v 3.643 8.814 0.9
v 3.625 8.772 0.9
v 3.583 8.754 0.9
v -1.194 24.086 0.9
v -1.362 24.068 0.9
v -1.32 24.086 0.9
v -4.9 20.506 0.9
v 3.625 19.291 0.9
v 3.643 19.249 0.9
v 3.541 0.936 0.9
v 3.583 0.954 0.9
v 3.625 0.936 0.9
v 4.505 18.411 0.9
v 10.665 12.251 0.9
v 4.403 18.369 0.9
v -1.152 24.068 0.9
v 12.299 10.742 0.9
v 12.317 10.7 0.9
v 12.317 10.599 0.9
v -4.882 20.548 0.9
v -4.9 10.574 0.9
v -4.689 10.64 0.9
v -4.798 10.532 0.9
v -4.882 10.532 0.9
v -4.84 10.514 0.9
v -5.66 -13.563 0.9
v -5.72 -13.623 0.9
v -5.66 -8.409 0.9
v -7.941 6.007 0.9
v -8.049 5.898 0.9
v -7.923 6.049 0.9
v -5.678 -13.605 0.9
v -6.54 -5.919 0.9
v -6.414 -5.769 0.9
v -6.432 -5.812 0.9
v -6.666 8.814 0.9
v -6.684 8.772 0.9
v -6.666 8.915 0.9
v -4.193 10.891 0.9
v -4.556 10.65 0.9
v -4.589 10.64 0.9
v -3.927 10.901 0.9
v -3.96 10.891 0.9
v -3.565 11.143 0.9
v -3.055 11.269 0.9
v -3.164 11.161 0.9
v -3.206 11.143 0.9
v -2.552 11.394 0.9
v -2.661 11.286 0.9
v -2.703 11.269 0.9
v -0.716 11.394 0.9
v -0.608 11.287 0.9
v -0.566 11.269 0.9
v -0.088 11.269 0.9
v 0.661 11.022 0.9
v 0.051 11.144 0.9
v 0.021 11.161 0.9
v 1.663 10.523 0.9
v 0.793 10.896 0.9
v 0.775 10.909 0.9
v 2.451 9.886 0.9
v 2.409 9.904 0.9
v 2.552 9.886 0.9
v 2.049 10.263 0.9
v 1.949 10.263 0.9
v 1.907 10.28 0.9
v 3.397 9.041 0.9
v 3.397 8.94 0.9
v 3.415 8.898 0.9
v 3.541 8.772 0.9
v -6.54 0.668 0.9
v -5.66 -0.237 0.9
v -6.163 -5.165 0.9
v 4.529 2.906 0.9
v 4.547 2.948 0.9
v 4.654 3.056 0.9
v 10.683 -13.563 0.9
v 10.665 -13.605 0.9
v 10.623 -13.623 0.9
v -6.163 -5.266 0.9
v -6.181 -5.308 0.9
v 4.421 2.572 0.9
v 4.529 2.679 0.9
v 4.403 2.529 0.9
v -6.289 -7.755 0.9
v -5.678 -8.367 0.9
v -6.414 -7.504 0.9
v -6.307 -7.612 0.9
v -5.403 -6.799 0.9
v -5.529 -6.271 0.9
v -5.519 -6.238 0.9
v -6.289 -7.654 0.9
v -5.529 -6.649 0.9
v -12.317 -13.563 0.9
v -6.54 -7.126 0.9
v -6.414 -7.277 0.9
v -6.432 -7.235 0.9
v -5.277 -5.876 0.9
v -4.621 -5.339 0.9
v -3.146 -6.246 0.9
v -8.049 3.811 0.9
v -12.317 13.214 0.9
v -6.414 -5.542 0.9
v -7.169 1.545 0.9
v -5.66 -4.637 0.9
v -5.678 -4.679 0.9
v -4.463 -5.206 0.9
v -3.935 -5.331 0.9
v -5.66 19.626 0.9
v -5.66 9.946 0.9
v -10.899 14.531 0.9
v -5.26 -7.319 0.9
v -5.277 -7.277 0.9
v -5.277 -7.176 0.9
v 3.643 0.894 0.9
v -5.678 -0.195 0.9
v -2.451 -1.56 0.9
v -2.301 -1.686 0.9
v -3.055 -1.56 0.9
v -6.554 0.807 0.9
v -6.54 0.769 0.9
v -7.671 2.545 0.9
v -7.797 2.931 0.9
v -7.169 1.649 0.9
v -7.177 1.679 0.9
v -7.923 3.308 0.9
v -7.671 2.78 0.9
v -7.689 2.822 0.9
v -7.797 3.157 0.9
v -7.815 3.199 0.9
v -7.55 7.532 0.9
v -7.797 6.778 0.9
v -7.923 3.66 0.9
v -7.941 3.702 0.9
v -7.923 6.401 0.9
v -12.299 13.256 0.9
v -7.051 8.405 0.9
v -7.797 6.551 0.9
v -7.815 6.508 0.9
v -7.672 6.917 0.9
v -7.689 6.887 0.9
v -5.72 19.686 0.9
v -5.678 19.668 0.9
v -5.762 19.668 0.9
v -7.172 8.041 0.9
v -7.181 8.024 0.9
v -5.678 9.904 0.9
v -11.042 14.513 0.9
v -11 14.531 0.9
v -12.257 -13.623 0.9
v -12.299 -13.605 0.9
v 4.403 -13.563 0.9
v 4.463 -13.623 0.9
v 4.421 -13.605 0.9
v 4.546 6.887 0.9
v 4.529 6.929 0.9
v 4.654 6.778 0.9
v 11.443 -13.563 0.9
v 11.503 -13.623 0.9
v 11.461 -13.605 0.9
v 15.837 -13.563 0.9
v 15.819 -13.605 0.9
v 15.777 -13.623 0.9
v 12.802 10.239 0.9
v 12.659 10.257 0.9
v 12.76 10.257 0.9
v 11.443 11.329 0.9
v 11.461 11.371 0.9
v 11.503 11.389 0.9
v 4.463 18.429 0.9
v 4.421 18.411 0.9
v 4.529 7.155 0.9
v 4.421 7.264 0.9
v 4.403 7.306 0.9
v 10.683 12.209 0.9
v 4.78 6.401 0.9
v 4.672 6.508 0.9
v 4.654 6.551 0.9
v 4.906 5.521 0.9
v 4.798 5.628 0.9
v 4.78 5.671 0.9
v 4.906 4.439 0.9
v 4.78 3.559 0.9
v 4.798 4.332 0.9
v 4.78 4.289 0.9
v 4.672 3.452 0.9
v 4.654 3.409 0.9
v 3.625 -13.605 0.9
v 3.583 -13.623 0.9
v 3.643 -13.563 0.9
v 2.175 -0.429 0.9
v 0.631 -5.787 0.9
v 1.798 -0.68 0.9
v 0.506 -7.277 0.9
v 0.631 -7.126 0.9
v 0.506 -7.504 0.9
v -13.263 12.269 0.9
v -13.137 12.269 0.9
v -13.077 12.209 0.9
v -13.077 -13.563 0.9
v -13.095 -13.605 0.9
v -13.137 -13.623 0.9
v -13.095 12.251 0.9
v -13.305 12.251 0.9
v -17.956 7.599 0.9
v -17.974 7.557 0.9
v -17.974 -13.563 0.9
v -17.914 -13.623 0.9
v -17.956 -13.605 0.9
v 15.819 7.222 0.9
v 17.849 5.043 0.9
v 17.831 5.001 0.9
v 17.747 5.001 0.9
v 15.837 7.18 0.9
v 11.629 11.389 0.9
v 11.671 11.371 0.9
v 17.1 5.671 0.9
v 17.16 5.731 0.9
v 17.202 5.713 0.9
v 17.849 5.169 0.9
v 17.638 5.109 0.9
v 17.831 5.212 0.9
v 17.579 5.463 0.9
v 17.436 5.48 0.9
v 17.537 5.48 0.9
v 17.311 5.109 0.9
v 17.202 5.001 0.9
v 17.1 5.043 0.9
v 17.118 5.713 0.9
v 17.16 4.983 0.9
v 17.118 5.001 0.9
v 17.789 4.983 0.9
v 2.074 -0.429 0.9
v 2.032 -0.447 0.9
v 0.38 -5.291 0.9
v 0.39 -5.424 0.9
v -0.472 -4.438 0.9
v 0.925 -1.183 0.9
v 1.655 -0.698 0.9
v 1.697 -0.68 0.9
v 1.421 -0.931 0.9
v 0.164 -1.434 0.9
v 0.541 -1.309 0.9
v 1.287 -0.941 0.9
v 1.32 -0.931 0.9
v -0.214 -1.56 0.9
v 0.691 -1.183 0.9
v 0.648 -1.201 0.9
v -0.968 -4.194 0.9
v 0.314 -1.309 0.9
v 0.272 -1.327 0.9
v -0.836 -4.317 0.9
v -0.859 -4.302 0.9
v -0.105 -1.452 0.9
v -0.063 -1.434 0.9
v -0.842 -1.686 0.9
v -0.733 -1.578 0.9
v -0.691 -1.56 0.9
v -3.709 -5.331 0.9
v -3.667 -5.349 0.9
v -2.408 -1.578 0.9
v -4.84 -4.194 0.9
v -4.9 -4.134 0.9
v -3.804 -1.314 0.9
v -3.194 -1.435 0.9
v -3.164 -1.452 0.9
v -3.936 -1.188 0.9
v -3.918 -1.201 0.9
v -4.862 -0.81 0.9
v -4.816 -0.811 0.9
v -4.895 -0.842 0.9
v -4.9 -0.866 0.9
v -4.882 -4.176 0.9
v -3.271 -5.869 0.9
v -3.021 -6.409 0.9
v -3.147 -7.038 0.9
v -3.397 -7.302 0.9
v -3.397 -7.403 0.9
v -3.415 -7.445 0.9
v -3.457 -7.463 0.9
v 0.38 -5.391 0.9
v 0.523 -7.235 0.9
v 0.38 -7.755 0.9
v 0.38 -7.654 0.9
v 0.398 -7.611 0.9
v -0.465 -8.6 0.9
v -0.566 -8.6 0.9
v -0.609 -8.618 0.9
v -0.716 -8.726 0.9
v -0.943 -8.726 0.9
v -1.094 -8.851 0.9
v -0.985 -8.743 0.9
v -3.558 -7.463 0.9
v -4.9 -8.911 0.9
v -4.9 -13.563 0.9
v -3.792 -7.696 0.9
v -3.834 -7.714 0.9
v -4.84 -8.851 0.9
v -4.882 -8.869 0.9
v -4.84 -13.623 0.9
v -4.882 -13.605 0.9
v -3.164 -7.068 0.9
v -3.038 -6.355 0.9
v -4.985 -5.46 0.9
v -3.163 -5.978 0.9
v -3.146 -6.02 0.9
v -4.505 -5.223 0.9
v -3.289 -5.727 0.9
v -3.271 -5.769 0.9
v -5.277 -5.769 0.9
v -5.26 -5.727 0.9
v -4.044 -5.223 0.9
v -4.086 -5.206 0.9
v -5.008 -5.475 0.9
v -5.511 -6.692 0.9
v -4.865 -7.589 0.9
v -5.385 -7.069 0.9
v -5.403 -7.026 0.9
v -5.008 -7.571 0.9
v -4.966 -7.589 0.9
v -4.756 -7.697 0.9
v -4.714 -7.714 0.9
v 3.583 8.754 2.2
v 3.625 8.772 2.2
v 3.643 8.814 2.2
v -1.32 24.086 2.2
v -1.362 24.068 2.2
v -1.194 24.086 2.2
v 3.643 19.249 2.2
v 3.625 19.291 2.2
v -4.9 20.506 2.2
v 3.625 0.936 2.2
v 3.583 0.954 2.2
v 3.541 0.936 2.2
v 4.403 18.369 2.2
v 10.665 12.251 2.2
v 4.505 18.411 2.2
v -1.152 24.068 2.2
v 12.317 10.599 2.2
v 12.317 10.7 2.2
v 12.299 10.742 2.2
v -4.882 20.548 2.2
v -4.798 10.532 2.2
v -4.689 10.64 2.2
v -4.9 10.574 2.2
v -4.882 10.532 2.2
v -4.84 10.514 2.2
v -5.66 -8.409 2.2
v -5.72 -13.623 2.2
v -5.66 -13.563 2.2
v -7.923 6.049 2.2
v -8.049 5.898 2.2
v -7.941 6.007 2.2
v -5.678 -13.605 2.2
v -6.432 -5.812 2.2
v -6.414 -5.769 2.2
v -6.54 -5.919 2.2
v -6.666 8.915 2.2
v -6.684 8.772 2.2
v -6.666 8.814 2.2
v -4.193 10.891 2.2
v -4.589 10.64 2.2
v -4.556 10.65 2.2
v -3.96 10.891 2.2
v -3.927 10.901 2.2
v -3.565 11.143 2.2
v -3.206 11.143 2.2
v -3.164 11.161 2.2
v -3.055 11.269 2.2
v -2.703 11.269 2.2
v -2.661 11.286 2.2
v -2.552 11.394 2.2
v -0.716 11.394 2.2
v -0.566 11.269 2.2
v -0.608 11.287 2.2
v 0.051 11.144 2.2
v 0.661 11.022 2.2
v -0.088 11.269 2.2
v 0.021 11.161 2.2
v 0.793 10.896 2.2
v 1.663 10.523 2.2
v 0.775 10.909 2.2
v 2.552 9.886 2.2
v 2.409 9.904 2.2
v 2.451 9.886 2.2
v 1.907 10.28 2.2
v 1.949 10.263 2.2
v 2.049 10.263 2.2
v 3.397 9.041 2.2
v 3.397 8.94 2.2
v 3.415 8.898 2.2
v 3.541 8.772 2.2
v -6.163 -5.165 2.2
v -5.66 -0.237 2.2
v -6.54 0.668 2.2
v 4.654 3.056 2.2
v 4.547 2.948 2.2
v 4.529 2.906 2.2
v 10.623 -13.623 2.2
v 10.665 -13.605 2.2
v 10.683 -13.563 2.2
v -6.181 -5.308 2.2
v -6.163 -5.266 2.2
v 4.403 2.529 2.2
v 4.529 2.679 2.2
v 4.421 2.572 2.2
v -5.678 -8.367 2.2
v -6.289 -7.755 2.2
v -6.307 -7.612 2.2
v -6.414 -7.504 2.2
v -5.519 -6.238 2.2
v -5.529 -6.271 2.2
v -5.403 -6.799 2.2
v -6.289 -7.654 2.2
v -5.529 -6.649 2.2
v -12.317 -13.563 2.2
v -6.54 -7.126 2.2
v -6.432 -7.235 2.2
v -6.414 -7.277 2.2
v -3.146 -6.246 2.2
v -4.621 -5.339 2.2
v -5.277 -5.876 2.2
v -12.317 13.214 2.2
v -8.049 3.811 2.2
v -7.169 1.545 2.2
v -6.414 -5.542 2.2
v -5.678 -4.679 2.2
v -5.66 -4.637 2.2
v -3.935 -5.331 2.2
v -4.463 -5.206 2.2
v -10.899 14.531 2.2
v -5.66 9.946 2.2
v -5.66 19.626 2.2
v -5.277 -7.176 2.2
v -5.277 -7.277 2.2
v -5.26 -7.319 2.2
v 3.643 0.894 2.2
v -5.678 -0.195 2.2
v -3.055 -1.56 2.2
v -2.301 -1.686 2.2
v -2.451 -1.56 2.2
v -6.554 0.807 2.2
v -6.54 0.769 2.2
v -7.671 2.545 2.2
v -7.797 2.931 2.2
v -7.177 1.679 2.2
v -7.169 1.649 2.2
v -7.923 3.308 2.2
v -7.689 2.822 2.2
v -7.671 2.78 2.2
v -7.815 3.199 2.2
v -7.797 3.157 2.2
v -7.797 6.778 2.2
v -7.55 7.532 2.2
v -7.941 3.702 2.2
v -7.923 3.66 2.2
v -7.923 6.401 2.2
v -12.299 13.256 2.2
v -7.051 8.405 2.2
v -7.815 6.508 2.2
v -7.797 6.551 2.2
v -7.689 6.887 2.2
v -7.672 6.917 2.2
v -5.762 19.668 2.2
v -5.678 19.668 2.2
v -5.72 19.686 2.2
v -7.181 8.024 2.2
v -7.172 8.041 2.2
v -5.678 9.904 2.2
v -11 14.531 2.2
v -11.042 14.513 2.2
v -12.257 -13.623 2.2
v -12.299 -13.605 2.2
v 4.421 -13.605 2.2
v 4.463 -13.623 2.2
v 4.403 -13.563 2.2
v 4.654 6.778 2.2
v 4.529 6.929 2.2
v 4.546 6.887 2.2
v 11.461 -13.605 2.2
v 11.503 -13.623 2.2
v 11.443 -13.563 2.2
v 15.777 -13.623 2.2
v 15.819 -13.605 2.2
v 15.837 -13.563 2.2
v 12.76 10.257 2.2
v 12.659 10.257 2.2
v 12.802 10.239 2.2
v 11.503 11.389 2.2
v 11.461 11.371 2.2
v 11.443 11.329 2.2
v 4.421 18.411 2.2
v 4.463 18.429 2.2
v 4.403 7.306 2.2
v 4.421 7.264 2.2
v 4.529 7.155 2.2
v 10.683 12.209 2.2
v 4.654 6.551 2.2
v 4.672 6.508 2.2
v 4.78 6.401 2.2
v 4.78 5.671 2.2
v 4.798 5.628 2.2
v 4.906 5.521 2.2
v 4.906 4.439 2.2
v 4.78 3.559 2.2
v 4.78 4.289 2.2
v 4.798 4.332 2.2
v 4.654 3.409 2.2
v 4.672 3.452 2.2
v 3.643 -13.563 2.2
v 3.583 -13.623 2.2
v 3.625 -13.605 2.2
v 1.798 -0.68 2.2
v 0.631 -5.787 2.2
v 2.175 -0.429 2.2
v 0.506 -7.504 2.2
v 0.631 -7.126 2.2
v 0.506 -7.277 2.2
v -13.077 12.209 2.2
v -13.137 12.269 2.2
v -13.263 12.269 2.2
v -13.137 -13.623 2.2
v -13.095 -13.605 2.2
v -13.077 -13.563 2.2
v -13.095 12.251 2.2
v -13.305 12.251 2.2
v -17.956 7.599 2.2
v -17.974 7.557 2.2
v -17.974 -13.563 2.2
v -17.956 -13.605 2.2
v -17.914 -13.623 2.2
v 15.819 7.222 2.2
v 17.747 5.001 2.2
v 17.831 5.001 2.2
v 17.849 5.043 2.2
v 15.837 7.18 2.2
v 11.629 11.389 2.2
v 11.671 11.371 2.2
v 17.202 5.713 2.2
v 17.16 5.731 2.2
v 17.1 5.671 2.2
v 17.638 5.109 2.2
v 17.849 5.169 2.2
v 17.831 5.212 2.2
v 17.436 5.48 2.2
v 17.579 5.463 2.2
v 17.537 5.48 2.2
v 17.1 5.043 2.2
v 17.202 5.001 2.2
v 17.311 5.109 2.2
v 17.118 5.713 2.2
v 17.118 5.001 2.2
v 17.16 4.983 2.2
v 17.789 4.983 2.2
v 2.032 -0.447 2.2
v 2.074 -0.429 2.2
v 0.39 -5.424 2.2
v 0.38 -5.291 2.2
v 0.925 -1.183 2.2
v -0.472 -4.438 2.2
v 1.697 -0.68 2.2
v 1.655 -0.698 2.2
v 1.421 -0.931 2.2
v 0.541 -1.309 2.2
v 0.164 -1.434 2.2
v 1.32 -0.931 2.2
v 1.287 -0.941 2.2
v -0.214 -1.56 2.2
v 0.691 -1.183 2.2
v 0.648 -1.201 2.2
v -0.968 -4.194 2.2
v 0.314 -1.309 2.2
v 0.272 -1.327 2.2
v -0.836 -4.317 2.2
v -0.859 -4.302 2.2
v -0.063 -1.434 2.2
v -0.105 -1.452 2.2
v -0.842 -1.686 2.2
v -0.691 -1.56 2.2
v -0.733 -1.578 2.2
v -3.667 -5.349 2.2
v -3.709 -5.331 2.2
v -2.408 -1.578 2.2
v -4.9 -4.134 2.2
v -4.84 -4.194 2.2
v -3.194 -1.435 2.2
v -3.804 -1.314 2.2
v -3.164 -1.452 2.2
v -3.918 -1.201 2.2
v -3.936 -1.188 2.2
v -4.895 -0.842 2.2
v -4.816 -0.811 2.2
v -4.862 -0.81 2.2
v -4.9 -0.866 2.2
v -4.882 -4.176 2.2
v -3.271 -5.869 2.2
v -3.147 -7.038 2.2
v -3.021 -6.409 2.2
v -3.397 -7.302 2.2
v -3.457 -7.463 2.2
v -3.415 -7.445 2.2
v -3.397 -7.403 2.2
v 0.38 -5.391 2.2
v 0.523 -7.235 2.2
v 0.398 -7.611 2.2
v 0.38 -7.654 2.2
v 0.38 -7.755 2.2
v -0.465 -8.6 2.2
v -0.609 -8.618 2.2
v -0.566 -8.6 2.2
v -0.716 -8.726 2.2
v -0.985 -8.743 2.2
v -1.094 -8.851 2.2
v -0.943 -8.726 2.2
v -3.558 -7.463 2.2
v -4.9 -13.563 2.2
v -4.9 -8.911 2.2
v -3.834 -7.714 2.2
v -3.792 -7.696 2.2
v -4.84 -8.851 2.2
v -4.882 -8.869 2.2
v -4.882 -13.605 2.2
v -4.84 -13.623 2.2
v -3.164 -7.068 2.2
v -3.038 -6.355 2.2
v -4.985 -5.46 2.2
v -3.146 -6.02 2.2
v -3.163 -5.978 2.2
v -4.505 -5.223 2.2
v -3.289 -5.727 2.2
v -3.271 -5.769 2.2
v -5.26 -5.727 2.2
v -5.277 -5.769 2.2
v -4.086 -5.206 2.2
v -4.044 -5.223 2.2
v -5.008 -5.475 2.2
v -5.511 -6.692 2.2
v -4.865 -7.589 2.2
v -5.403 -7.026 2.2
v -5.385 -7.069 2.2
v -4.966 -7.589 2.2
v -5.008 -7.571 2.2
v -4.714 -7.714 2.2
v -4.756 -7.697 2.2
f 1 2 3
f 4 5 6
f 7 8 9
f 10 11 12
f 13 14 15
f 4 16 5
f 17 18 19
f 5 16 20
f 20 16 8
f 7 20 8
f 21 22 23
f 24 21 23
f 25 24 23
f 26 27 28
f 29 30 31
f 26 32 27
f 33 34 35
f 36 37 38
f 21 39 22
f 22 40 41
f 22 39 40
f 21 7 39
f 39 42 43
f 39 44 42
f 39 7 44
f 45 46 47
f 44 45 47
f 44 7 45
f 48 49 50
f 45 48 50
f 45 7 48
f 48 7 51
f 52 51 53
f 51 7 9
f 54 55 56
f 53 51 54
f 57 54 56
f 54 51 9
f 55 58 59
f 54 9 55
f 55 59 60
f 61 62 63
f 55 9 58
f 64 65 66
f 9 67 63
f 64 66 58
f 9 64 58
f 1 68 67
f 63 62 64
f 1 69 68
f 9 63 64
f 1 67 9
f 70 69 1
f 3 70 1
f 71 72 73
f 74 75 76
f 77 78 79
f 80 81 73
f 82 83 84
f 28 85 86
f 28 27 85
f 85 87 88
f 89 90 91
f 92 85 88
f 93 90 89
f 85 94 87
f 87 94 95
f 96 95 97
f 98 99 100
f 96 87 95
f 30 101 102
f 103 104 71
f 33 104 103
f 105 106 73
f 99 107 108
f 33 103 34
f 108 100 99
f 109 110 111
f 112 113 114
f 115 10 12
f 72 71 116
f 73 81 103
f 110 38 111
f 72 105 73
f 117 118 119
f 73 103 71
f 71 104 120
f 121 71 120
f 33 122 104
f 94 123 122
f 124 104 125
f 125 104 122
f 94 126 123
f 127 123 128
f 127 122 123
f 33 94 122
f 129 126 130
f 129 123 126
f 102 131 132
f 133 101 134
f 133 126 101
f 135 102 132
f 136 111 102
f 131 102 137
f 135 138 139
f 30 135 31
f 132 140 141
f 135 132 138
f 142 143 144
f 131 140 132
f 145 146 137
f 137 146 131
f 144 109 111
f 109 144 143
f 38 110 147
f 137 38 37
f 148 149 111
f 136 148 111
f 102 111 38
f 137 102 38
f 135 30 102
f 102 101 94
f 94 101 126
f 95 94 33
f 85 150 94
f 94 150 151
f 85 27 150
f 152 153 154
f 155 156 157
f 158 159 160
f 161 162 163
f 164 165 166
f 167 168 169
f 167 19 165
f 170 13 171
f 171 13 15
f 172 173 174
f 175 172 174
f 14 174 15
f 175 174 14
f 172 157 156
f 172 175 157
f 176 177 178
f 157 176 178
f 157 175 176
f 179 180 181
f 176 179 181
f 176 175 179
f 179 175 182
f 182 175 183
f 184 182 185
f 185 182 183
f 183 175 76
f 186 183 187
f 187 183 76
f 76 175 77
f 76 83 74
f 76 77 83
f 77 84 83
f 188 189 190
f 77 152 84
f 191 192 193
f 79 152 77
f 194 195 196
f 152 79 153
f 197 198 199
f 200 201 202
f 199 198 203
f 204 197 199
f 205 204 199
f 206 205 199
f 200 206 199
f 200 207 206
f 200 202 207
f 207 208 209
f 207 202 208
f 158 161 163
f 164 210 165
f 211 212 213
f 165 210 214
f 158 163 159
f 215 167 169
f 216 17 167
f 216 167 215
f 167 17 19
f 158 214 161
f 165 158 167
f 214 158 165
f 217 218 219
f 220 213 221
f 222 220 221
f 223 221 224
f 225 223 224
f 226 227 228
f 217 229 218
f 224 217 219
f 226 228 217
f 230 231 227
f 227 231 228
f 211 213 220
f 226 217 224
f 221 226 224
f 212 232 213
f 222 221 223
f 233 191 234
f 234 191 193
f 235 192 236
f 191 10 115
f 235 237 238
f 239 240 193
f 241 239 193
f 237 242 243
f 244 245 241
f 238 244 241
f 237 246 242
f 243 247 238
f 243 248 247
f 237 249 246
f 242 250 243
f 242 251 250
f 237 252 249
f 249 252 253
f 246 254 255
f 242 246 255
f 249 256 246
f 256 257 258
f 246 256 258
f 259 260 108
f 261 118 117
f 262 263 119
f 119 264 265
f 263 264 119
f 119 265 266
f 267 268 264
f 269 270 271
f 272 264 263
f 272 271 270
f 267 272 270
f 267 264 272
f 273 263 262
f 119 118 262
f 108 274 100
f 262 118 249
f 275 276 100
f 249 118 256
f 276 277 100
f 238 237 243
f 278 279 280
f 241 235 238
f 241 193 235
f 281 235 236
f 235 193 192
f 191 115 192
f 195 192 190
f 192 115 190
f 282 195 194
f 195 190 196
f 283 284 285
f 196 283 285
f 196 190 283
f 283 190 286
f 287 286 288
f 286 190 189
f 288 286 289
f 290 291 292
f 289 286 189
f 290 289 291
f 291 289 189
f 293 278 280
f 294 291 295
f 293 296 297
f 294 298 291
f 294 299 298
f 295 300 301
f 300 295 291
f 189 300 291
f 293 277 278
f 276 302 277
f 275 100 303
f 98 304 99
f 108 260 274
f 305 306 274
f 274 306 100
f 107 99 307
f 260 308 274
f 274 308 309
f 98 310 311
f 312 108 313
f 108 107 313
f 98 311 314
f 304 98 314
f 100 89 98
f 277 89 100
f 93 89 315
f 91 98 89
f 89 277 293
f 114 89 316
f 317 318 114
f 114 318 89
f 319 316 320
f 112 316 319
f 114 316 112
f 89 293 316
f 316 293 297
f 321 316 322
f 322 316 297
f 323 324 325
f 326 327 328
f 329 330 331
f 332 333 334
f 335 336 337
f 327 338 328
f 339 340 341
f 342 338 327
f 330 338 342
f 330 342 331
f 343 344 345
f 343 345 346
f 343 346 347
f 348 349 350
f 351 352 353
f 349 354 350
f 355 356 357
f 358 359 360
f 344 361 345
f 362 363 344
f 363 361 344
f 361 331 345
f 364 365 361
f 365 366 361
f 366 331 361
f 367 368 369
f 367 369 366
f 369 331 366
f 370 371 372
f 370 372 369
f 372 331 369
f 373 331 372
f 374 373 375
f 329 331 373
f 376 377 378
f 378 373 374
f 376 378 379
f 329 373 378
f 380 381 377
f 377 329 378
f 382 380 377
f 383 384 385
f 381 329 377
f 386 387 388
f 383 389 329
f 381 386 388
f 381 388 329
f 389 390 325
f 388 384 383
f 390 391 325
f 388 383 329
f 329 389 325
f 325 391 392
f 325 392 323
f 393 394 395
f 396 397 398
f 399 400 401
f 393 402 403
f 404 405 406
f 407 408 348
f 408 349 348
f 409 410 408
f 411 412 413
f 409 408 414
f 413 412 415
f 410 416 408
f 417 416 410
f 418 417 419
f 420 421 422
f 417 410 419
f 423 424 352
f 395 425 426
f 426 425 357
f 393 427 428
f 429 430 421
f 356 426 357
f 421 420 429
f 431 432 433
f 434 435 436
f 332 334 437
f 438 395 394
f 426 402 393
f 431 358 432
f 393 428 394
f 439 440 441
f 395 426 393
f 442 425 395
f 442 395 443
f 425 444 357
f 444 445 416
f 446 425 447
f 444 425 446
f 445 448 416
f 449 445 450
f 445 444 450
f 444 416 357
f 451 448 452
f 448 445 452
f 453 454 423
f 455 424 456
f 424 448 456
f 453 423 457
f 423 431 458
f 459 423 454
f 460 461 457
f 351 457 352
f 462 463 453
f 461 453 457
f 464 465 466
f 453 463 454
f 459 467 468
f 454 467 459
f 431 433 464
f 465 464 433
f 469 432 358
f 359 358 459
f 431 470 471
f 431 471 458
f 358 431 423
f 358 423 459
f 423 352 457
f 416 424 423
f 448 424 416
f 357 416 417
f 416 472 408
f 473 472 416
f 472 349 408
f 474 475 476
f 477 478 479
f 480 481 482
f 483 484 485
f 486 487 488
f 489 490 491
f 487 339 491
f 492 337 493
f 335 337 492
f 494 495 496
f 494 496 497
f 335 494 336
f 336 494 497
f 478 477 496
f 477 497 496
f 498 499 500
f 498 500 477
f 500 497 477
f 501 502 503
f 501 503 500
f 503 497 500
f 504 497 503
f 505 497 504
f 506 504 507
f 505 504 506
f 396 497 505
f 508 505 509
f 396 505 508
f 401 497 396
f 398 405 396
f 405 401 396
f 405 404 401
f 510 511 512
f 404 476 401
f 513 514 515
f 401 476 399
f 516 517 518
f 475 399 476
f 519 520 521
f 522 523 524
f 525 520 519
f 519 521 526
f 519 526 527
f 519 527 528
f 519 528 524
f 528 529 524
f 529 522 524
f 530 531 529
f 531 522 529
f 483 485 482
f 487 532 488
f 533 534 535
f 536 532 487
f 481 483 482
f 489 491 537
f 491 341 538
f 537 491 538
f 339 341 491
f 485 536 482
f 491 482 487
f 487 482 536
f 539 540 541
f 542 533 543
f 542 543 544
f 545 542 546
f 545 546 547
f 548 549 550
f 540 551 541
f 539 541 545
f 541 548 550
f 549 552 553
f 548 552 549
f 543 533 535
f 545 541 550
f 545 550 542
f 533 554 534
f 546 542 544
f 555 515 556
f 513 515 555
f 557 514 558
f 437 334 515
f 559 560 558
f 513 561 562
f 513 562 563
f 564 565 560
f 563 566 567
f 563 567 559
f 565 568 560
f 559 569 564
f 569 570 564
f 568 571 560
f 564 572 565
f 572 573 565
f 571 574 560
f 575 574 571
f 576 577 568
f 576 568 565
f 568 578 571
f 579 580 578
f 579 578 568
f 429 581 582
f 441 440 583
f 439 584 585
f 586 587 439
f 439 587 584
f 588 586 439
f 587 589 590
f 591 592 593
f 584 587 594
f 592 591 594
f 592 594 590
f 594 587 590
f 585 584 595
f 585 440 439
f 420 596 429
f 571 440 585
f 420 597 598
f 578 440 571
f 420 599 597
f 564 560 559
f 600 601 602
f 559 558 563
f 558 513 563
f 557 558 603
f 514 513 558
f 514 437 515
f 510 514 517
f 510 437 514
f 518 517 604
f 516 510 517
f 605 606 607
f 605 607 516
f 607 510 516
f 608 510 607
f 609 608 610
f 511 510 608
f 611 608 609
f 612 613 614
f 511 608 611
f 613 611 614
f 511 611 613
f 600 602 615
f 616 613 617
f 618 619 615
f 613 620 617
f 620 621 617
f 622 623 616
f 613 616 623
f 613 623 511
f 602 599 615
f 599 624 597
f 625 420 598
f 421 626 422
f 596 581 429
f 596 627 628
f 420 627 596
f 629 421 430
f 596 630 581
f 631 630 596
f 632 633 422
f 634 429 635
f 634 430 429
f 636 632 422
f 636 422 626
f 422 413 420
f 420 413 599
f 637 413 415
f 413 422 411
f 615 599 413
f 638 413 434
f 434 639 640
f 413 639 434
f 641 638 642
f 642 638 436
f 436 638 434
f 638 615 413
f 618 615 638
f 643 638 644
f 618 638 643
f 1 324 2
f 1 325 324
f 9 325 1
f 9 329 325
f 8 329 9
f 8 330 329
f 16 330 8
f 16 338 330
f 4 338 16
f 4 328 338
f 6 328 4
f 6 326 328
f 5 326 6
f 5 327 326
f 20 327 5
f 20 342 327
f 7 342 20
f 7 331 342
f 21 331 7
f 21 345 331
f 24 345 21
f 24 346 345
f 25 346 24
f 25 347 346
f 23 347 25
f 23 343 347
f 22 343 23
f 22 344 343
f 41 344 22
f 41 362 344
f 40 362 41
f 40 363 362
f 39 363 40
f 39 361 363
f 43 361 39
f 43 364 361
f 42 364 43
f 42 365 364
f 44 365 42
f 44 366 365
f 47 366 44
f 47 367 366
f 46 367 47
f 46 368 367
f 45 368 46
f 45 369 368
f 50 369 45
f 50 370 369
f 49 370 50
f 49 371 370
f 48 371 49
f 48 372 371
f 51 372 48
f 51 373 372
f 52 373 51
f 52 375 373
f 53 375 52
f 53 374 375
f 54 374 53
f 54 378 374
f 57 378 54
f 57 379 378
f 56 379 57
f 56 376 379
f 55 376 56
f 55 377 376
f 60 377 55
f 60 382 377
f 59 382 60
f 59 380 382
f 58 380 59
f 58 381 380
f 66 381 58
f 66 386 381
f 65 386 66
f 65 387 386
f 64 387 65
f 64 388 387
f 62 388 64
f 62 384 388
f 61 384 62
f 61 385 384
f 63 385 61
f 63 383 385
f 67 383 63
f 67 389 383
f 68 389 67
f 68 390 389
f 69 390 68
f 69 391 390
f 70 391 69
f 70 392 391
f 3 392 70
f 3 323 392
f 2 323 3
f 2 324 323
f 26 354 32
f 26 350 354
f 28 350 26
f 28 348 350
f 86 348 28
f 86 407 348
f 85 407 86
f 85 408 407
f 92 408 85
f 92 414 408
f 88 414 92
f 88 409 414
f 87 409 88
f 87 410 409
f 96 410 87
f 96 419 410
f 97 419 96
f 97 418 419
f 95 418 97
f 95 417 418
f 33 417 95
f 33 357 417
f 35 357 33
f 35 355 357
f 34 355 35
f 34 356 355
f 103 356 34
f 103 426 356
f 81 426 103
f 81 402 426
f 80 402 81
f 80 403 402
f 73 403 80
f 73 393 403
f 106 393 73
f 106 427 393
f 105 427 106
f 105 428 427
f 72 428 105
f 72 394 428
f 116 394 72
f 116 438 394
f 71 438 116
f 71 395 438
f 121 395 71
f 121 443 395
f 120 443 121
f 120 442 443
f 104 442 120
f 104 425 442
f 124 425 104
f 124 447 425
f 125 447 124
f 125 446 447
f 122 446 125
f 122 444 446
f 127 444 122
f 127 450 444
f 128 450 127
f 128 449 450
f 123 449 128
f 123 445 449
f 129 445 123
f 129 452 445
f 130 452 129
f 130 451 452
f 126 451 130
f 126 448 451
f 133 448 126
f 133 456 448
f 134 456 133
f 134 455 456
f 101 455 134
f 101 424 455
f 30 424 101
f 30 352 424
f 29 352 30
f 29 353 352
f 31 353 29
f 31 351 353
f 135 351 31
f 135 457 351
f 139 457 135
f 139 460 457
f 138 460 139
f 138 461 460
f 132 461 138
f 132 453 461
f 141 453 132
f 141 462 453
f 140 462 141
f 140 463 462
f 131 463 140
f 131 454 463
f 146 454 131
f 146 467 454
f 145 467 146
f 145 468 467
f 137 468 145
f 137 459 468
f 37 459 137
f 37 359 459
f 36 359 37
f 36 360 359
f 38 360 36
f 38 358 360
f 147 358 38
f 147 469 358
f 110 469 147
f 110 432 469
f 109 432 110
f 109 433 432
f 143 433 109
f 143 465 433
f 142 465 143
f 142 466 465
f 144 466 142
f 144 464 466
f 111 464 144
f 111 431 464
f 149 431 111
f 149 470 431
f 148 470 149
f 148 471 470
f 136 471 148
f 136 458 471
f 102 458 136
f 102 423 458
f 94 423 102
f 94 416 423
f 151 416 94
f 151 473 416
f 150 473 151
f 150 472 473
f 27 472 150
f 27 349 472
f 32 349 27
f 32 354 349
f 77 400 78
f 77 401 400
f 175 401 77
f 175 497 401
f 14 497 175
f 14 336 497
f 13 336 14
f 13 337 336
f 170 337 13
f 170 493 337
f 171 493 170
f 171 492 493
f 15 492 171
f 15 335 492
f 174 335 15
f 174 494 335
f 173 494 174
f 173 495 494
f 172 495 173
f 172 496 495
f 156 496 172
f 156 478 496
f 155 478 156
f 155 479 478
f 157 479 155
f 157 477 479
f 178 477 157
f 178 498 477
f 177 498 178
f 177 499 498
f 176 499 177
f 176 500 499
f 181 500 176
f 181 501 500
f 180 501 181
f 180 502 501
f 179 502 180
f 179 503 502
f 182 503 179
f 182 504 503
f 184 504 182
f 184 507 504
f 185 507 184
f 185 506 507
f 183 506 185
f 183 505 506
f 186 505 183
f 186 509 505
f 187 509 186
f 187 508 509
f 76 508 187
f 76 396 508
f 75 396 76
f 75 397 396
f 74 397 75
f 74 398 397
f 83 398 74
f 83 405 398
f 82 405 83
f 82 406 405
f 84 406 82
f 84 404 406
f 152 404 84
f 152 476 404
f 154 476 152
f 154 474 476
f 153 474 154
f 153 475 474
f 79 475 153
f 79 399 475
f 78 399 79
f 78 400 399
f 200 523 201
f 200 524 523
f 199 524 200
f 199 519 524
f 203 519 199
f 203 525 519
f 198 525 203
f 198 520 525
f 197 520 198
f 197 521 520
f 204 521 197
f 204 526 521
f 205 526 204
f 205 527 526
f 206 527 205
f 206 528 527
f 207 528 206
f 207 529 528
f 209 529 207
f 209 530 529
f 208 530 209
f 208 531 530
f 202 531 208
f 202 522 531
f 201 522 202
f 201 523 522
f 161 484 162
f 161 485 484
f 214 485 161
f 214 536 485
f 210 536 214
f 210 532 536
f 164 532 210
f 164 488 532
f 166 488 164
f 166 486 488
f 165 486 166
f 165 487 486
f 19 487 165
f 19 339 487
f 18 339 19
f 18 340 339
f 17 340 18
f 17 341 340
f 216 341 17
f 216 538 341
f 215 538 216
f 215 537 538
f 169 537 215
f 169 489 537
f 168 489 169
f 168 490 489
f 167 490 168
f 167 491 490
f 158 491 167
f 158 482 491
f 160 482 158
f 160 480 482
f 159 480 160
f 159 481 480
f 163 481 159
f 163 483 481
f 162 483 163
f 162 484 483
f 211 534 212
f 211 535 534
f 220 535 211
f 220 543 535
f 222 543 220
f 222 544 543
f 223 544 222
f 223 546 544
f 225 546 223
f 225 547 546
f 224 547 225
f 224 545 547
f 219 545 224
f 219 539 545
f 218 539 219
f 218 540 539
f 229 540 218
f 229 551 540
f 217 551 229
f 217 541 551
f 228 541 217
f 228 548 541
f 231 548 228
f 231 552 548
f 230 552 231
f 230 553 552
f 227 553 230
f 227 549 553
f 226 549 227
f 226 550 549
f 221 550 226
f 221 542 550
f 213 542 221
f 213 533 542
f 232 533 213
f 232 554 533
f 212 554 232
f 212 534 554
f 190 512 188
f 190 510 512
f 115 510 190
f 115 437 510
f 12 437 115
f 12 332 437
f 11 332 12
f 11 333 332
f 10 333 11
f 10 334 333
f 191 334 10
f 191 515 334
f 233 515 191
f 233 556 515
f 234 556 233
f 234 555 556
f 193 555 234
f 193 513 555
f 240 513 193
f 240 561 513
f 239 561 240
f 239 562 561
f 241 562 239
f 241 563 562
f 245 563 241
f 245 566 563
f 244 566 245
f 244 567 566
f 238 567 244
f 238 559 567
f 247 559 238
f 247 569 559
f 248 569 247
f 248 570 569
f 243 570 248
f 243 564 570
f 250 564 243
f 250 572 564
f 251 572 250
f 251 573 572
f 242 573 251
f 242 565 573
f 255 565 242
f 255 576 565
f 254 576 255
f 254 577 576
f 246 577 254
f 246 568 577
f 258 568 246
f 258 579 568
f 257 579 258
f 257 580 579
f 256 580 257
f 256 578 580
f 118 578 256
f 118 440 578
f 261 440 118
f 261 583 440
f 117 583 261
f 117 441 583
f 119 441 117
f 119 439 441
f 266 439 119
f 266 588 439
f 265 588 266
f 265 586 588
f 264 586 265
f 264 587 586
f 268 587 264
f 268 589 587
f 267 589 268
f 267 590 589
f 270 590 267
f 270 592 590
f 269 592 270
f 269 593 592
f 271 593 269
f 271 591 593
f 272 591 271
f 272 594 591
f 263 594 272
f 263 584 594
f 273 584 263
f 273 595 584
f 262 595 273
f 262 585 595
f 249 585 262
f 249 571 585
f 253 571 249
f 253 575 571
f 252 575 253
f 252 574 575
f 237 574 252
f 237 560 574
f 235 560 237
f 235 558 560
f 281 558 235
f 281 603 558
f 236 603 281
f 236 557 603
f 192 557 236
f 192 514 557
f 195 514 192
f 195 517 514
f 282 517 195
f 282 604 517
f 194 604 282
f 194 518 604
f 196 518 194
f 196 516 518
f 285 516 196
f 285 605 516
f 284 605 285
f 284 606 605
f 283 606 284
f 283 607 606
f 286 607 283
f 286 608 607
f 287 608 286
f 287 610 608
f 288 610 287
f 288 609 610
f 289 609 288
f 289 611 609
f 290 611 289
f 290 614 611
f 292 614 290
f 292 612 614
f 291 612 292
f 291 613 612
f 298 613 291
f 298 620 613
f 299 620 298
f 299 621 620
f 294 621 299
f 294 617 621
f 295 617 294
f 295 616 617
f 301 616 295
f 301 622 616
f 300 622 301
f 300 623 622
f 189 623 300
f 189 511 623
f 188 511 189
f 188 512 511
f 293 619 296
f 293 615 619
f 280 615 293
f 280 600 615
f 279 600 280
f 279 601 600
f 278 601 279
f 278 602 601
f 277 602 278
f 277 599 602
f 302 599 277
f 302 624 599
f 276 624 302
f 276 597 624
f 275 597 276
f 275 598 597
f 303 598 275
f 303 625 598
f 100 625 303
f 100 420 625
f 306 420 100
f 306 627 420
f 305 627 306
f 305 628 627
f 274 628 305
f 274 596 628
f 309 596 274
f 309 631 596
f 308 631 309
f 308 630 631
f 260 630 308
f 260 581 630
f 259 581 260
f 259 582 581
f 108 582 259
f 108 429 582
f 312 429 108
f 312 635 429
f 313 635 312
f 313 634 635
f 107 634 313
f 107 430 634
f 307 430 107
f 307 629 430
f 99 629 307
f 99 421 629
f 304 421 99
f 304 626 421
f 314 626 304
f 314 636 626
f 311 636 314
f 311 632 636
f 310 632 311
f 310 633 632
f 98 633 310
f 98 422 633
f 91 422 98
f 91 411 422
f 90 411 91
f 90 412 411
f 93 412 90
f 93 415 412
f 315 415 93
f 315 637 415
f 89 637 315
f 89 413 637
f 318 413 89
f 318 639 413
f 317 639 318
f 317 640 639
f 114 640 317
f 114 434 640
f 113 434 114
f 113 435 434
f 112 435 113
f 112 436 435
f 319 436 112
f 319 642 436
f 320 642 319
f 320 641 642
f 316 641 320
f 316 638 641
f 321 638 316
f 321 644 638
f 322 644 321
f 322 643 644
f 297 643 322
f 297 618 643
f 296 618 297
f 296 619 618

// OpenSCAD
$fn = 24;
translate([0, -2.500, 0.900])
  linear_extrude(height=1.300) {
offset(r=0.06, $fn=8) {
    polygon(points=[[-4.463,-2.766],[-4.589,-2.891],[-4.966,-3.017],[-5.217,-3.269],[-5.217,-3.394],[-5.469,-3.771],[-5.469,-4.149],[-5.343,-4.274],[-5.343,-4.526],[-5.217,-4.651],[-5.217,-4.777],[-4.966,-5.029],[-4.840,-5.029],[-4.714,-5.154],[-3.834,-5.154],[-3.583,-4.903],[-3.457,-4.903],[-3.457,-4.777],[-3.206,-4.526],[-3.080,-3.897],[-3.206,-3.771],[-3.206,-3.520],[-3.331,-3.394],[-3.331,-3.269],[-3.709,-2.891],[-3.960,-2.891],[-4.086,-2.766]], paths=[[0,1,2,3,4,5,6,7,8,9,10,11,12,13,14,15,16,17,18,19,20,21,22,23,24,25,26]]);
    polygon(points=[[3.583,3.520],[3.583,3.394],[2.200,2.011],[2.074,2.011],[1.823,1.760],[1.697,1.760],[1.446,1.509],[1.320,1.509],[0.943,1.257],[0.691,1.257],[0.566,1.131],[0.314,1.131],[0.189,1.006],[-0.063,1.006],[-0.189,0.880],[-0.691,0.880],[-0.817,0.754],[-2.326,0.754],[-2.451,0.880],[-3.080,0.880],[-3.206,1.006],[-3.834,1.131],[-3.960,1.257],[-4.840,1.634],[-4.840,-1.634],[-0.943,-1.634],[-0.817,-1.760],[-0.440,-1.886],[0.440,-2.766],[0.440,-2.891],[0.691,-3.269],[0.691,-4.651],[0.566,-4.777],[0.566,-5.029],[0.440,-5.154],[0.440,-5.280],[-0.440,-6.160],[-0.566,-6.160],[-0.691,-6.286],[-0.943,-6.286],[-1.069,-6.411],[-4.840,-6.411],[-4.840,-11.063],[3.583,-11.063]], paths=[[0,1,2,3,4,5,6,7,8,9,10,11,12,13,14,15,16,17,18,19,20,21,22,23,24,25,26,27,28,29,30,31,32,33,34,35,36,37,38,39,40,41,42,43]]);
    polygon(points=[[17.160,8.297],[17.160,7.543],[17.286,7.669],[17.663,7.669],[17.789,7.543],[17.789,7.669],[17.537,7.920],[17.411,7.920],[17.160,8.171]], paths=[[0,1,2,3,4,5,6,7,8]]);
    polygon(points=[[11.503,13.829],[11.503,-11.063],[15.777,-11.063],[15.777,9.680],[12.760,12.697],[12.634,12.697],[12.257,13.074],[12.257,13.200],[11.629,13.829]], paths=[[0,1,2,3,4,5,6,7,8]]);
    polygon(points=[[-13.137,14.709],[-13.263,14.709],[-17.914,10.057],[-17.914,-11.063],[-13.137,-11.063]], paths=[[0,1,2,3,4]]);
    polygon(points=[[4.463,20.869],[4.463,9.806],[4.589,9.680],[4.589,9.429],[4.714,9.303],[4.714,9.051],[4.840,8.926],[4.840,8.171],[4.966,8.046],[4.966,6.914],[4.840,6.789],[4.840,6.034],[4.714,5.909],[4.714,5.531],[4.589,5.406],[4.589,5.154],[4.463,5.029],[4.463,-11.063],[10.623,-11.063],[10.623,14.709]], paths=[[0,1,2,3,4,5,6,7,8,9,10,11,12,13,14,15,16,17,18,19]]);
    polygon(points=[[-5.720,22.126],[-10.874,16.971],[-11.000,16.971],[-12.257,15.714],[-12.257,-11.063],[-5.720,-11.063],[-5.720,-5.909],[-6.349,-5.280],[-6.349,-5.154],[-6.474,-5.029],[-6.474,-4.777],[-6.600,-4.651],[-6.600,-3.394],[-6.474,-3.269],[-6.474,-3.017],[-6.223,-2.766],[-6.223,-2.640],[-5.720,-2.137],[-5.720,2.263],[-6.600,3.143],[-6.600,3.269],[-7.229,4.023],[-7.229,4.149],[-7.731,5.029],[-7.731,5.280],[-7.857,5.406],[-7.857,5.657],[-7.983,5.783],[-7.983,6.160],[-8.109,6.286],[-8.109,8.423],[-7.983,8.549],[-7.983,8.926],[-7.857,9.051],[-7.857,9.303],[-7.731,9.429],[-7.606,10.057],[-7.229,10.560],[-7.103,10.937],[-6.726,11.314],[-6.726,11.440],[-5.720,12.446]], paths=[[0,1,2,3,4,5,6,7,8,9,10,11,12,13,14,15,16,17,18,19,20,21,22,23,24,25,26,27,28,29,30,31,32,33,34,35,36,37,38,39,40,41]]);
    polygon(points=[[-1.320,26.526],[-4.840,23.006],[-4.840,13.074],[-4.714,13.200],[-4.589,13.200],[-4.211,13.451],[-3.960,13.451],[-3.583,13.703],[-3.206,13.703],[-3.080,13.829],[-2.703,13.829],[-2.577,13.954],[-0.691,13.954],[-0.566,13.829],[-0.063,13.829],[0.063,13.703],[0.691,13.577],[0.817,13.451],[1.697,13.074],[1.949,12.823],[2.074,12.823],[2.451,12.446],[2.577,12.446],[3.457,11.566],[3.457,11.440],[3.583,11.314],[3.583,21.749],[-1.194,26.526]], paths=[[0,1,2,3,4,5,6,7,8,9,10,11,12,13,14,15,16,17,18,19,20,21,22,23,24,25,26,27]]);
}
}
